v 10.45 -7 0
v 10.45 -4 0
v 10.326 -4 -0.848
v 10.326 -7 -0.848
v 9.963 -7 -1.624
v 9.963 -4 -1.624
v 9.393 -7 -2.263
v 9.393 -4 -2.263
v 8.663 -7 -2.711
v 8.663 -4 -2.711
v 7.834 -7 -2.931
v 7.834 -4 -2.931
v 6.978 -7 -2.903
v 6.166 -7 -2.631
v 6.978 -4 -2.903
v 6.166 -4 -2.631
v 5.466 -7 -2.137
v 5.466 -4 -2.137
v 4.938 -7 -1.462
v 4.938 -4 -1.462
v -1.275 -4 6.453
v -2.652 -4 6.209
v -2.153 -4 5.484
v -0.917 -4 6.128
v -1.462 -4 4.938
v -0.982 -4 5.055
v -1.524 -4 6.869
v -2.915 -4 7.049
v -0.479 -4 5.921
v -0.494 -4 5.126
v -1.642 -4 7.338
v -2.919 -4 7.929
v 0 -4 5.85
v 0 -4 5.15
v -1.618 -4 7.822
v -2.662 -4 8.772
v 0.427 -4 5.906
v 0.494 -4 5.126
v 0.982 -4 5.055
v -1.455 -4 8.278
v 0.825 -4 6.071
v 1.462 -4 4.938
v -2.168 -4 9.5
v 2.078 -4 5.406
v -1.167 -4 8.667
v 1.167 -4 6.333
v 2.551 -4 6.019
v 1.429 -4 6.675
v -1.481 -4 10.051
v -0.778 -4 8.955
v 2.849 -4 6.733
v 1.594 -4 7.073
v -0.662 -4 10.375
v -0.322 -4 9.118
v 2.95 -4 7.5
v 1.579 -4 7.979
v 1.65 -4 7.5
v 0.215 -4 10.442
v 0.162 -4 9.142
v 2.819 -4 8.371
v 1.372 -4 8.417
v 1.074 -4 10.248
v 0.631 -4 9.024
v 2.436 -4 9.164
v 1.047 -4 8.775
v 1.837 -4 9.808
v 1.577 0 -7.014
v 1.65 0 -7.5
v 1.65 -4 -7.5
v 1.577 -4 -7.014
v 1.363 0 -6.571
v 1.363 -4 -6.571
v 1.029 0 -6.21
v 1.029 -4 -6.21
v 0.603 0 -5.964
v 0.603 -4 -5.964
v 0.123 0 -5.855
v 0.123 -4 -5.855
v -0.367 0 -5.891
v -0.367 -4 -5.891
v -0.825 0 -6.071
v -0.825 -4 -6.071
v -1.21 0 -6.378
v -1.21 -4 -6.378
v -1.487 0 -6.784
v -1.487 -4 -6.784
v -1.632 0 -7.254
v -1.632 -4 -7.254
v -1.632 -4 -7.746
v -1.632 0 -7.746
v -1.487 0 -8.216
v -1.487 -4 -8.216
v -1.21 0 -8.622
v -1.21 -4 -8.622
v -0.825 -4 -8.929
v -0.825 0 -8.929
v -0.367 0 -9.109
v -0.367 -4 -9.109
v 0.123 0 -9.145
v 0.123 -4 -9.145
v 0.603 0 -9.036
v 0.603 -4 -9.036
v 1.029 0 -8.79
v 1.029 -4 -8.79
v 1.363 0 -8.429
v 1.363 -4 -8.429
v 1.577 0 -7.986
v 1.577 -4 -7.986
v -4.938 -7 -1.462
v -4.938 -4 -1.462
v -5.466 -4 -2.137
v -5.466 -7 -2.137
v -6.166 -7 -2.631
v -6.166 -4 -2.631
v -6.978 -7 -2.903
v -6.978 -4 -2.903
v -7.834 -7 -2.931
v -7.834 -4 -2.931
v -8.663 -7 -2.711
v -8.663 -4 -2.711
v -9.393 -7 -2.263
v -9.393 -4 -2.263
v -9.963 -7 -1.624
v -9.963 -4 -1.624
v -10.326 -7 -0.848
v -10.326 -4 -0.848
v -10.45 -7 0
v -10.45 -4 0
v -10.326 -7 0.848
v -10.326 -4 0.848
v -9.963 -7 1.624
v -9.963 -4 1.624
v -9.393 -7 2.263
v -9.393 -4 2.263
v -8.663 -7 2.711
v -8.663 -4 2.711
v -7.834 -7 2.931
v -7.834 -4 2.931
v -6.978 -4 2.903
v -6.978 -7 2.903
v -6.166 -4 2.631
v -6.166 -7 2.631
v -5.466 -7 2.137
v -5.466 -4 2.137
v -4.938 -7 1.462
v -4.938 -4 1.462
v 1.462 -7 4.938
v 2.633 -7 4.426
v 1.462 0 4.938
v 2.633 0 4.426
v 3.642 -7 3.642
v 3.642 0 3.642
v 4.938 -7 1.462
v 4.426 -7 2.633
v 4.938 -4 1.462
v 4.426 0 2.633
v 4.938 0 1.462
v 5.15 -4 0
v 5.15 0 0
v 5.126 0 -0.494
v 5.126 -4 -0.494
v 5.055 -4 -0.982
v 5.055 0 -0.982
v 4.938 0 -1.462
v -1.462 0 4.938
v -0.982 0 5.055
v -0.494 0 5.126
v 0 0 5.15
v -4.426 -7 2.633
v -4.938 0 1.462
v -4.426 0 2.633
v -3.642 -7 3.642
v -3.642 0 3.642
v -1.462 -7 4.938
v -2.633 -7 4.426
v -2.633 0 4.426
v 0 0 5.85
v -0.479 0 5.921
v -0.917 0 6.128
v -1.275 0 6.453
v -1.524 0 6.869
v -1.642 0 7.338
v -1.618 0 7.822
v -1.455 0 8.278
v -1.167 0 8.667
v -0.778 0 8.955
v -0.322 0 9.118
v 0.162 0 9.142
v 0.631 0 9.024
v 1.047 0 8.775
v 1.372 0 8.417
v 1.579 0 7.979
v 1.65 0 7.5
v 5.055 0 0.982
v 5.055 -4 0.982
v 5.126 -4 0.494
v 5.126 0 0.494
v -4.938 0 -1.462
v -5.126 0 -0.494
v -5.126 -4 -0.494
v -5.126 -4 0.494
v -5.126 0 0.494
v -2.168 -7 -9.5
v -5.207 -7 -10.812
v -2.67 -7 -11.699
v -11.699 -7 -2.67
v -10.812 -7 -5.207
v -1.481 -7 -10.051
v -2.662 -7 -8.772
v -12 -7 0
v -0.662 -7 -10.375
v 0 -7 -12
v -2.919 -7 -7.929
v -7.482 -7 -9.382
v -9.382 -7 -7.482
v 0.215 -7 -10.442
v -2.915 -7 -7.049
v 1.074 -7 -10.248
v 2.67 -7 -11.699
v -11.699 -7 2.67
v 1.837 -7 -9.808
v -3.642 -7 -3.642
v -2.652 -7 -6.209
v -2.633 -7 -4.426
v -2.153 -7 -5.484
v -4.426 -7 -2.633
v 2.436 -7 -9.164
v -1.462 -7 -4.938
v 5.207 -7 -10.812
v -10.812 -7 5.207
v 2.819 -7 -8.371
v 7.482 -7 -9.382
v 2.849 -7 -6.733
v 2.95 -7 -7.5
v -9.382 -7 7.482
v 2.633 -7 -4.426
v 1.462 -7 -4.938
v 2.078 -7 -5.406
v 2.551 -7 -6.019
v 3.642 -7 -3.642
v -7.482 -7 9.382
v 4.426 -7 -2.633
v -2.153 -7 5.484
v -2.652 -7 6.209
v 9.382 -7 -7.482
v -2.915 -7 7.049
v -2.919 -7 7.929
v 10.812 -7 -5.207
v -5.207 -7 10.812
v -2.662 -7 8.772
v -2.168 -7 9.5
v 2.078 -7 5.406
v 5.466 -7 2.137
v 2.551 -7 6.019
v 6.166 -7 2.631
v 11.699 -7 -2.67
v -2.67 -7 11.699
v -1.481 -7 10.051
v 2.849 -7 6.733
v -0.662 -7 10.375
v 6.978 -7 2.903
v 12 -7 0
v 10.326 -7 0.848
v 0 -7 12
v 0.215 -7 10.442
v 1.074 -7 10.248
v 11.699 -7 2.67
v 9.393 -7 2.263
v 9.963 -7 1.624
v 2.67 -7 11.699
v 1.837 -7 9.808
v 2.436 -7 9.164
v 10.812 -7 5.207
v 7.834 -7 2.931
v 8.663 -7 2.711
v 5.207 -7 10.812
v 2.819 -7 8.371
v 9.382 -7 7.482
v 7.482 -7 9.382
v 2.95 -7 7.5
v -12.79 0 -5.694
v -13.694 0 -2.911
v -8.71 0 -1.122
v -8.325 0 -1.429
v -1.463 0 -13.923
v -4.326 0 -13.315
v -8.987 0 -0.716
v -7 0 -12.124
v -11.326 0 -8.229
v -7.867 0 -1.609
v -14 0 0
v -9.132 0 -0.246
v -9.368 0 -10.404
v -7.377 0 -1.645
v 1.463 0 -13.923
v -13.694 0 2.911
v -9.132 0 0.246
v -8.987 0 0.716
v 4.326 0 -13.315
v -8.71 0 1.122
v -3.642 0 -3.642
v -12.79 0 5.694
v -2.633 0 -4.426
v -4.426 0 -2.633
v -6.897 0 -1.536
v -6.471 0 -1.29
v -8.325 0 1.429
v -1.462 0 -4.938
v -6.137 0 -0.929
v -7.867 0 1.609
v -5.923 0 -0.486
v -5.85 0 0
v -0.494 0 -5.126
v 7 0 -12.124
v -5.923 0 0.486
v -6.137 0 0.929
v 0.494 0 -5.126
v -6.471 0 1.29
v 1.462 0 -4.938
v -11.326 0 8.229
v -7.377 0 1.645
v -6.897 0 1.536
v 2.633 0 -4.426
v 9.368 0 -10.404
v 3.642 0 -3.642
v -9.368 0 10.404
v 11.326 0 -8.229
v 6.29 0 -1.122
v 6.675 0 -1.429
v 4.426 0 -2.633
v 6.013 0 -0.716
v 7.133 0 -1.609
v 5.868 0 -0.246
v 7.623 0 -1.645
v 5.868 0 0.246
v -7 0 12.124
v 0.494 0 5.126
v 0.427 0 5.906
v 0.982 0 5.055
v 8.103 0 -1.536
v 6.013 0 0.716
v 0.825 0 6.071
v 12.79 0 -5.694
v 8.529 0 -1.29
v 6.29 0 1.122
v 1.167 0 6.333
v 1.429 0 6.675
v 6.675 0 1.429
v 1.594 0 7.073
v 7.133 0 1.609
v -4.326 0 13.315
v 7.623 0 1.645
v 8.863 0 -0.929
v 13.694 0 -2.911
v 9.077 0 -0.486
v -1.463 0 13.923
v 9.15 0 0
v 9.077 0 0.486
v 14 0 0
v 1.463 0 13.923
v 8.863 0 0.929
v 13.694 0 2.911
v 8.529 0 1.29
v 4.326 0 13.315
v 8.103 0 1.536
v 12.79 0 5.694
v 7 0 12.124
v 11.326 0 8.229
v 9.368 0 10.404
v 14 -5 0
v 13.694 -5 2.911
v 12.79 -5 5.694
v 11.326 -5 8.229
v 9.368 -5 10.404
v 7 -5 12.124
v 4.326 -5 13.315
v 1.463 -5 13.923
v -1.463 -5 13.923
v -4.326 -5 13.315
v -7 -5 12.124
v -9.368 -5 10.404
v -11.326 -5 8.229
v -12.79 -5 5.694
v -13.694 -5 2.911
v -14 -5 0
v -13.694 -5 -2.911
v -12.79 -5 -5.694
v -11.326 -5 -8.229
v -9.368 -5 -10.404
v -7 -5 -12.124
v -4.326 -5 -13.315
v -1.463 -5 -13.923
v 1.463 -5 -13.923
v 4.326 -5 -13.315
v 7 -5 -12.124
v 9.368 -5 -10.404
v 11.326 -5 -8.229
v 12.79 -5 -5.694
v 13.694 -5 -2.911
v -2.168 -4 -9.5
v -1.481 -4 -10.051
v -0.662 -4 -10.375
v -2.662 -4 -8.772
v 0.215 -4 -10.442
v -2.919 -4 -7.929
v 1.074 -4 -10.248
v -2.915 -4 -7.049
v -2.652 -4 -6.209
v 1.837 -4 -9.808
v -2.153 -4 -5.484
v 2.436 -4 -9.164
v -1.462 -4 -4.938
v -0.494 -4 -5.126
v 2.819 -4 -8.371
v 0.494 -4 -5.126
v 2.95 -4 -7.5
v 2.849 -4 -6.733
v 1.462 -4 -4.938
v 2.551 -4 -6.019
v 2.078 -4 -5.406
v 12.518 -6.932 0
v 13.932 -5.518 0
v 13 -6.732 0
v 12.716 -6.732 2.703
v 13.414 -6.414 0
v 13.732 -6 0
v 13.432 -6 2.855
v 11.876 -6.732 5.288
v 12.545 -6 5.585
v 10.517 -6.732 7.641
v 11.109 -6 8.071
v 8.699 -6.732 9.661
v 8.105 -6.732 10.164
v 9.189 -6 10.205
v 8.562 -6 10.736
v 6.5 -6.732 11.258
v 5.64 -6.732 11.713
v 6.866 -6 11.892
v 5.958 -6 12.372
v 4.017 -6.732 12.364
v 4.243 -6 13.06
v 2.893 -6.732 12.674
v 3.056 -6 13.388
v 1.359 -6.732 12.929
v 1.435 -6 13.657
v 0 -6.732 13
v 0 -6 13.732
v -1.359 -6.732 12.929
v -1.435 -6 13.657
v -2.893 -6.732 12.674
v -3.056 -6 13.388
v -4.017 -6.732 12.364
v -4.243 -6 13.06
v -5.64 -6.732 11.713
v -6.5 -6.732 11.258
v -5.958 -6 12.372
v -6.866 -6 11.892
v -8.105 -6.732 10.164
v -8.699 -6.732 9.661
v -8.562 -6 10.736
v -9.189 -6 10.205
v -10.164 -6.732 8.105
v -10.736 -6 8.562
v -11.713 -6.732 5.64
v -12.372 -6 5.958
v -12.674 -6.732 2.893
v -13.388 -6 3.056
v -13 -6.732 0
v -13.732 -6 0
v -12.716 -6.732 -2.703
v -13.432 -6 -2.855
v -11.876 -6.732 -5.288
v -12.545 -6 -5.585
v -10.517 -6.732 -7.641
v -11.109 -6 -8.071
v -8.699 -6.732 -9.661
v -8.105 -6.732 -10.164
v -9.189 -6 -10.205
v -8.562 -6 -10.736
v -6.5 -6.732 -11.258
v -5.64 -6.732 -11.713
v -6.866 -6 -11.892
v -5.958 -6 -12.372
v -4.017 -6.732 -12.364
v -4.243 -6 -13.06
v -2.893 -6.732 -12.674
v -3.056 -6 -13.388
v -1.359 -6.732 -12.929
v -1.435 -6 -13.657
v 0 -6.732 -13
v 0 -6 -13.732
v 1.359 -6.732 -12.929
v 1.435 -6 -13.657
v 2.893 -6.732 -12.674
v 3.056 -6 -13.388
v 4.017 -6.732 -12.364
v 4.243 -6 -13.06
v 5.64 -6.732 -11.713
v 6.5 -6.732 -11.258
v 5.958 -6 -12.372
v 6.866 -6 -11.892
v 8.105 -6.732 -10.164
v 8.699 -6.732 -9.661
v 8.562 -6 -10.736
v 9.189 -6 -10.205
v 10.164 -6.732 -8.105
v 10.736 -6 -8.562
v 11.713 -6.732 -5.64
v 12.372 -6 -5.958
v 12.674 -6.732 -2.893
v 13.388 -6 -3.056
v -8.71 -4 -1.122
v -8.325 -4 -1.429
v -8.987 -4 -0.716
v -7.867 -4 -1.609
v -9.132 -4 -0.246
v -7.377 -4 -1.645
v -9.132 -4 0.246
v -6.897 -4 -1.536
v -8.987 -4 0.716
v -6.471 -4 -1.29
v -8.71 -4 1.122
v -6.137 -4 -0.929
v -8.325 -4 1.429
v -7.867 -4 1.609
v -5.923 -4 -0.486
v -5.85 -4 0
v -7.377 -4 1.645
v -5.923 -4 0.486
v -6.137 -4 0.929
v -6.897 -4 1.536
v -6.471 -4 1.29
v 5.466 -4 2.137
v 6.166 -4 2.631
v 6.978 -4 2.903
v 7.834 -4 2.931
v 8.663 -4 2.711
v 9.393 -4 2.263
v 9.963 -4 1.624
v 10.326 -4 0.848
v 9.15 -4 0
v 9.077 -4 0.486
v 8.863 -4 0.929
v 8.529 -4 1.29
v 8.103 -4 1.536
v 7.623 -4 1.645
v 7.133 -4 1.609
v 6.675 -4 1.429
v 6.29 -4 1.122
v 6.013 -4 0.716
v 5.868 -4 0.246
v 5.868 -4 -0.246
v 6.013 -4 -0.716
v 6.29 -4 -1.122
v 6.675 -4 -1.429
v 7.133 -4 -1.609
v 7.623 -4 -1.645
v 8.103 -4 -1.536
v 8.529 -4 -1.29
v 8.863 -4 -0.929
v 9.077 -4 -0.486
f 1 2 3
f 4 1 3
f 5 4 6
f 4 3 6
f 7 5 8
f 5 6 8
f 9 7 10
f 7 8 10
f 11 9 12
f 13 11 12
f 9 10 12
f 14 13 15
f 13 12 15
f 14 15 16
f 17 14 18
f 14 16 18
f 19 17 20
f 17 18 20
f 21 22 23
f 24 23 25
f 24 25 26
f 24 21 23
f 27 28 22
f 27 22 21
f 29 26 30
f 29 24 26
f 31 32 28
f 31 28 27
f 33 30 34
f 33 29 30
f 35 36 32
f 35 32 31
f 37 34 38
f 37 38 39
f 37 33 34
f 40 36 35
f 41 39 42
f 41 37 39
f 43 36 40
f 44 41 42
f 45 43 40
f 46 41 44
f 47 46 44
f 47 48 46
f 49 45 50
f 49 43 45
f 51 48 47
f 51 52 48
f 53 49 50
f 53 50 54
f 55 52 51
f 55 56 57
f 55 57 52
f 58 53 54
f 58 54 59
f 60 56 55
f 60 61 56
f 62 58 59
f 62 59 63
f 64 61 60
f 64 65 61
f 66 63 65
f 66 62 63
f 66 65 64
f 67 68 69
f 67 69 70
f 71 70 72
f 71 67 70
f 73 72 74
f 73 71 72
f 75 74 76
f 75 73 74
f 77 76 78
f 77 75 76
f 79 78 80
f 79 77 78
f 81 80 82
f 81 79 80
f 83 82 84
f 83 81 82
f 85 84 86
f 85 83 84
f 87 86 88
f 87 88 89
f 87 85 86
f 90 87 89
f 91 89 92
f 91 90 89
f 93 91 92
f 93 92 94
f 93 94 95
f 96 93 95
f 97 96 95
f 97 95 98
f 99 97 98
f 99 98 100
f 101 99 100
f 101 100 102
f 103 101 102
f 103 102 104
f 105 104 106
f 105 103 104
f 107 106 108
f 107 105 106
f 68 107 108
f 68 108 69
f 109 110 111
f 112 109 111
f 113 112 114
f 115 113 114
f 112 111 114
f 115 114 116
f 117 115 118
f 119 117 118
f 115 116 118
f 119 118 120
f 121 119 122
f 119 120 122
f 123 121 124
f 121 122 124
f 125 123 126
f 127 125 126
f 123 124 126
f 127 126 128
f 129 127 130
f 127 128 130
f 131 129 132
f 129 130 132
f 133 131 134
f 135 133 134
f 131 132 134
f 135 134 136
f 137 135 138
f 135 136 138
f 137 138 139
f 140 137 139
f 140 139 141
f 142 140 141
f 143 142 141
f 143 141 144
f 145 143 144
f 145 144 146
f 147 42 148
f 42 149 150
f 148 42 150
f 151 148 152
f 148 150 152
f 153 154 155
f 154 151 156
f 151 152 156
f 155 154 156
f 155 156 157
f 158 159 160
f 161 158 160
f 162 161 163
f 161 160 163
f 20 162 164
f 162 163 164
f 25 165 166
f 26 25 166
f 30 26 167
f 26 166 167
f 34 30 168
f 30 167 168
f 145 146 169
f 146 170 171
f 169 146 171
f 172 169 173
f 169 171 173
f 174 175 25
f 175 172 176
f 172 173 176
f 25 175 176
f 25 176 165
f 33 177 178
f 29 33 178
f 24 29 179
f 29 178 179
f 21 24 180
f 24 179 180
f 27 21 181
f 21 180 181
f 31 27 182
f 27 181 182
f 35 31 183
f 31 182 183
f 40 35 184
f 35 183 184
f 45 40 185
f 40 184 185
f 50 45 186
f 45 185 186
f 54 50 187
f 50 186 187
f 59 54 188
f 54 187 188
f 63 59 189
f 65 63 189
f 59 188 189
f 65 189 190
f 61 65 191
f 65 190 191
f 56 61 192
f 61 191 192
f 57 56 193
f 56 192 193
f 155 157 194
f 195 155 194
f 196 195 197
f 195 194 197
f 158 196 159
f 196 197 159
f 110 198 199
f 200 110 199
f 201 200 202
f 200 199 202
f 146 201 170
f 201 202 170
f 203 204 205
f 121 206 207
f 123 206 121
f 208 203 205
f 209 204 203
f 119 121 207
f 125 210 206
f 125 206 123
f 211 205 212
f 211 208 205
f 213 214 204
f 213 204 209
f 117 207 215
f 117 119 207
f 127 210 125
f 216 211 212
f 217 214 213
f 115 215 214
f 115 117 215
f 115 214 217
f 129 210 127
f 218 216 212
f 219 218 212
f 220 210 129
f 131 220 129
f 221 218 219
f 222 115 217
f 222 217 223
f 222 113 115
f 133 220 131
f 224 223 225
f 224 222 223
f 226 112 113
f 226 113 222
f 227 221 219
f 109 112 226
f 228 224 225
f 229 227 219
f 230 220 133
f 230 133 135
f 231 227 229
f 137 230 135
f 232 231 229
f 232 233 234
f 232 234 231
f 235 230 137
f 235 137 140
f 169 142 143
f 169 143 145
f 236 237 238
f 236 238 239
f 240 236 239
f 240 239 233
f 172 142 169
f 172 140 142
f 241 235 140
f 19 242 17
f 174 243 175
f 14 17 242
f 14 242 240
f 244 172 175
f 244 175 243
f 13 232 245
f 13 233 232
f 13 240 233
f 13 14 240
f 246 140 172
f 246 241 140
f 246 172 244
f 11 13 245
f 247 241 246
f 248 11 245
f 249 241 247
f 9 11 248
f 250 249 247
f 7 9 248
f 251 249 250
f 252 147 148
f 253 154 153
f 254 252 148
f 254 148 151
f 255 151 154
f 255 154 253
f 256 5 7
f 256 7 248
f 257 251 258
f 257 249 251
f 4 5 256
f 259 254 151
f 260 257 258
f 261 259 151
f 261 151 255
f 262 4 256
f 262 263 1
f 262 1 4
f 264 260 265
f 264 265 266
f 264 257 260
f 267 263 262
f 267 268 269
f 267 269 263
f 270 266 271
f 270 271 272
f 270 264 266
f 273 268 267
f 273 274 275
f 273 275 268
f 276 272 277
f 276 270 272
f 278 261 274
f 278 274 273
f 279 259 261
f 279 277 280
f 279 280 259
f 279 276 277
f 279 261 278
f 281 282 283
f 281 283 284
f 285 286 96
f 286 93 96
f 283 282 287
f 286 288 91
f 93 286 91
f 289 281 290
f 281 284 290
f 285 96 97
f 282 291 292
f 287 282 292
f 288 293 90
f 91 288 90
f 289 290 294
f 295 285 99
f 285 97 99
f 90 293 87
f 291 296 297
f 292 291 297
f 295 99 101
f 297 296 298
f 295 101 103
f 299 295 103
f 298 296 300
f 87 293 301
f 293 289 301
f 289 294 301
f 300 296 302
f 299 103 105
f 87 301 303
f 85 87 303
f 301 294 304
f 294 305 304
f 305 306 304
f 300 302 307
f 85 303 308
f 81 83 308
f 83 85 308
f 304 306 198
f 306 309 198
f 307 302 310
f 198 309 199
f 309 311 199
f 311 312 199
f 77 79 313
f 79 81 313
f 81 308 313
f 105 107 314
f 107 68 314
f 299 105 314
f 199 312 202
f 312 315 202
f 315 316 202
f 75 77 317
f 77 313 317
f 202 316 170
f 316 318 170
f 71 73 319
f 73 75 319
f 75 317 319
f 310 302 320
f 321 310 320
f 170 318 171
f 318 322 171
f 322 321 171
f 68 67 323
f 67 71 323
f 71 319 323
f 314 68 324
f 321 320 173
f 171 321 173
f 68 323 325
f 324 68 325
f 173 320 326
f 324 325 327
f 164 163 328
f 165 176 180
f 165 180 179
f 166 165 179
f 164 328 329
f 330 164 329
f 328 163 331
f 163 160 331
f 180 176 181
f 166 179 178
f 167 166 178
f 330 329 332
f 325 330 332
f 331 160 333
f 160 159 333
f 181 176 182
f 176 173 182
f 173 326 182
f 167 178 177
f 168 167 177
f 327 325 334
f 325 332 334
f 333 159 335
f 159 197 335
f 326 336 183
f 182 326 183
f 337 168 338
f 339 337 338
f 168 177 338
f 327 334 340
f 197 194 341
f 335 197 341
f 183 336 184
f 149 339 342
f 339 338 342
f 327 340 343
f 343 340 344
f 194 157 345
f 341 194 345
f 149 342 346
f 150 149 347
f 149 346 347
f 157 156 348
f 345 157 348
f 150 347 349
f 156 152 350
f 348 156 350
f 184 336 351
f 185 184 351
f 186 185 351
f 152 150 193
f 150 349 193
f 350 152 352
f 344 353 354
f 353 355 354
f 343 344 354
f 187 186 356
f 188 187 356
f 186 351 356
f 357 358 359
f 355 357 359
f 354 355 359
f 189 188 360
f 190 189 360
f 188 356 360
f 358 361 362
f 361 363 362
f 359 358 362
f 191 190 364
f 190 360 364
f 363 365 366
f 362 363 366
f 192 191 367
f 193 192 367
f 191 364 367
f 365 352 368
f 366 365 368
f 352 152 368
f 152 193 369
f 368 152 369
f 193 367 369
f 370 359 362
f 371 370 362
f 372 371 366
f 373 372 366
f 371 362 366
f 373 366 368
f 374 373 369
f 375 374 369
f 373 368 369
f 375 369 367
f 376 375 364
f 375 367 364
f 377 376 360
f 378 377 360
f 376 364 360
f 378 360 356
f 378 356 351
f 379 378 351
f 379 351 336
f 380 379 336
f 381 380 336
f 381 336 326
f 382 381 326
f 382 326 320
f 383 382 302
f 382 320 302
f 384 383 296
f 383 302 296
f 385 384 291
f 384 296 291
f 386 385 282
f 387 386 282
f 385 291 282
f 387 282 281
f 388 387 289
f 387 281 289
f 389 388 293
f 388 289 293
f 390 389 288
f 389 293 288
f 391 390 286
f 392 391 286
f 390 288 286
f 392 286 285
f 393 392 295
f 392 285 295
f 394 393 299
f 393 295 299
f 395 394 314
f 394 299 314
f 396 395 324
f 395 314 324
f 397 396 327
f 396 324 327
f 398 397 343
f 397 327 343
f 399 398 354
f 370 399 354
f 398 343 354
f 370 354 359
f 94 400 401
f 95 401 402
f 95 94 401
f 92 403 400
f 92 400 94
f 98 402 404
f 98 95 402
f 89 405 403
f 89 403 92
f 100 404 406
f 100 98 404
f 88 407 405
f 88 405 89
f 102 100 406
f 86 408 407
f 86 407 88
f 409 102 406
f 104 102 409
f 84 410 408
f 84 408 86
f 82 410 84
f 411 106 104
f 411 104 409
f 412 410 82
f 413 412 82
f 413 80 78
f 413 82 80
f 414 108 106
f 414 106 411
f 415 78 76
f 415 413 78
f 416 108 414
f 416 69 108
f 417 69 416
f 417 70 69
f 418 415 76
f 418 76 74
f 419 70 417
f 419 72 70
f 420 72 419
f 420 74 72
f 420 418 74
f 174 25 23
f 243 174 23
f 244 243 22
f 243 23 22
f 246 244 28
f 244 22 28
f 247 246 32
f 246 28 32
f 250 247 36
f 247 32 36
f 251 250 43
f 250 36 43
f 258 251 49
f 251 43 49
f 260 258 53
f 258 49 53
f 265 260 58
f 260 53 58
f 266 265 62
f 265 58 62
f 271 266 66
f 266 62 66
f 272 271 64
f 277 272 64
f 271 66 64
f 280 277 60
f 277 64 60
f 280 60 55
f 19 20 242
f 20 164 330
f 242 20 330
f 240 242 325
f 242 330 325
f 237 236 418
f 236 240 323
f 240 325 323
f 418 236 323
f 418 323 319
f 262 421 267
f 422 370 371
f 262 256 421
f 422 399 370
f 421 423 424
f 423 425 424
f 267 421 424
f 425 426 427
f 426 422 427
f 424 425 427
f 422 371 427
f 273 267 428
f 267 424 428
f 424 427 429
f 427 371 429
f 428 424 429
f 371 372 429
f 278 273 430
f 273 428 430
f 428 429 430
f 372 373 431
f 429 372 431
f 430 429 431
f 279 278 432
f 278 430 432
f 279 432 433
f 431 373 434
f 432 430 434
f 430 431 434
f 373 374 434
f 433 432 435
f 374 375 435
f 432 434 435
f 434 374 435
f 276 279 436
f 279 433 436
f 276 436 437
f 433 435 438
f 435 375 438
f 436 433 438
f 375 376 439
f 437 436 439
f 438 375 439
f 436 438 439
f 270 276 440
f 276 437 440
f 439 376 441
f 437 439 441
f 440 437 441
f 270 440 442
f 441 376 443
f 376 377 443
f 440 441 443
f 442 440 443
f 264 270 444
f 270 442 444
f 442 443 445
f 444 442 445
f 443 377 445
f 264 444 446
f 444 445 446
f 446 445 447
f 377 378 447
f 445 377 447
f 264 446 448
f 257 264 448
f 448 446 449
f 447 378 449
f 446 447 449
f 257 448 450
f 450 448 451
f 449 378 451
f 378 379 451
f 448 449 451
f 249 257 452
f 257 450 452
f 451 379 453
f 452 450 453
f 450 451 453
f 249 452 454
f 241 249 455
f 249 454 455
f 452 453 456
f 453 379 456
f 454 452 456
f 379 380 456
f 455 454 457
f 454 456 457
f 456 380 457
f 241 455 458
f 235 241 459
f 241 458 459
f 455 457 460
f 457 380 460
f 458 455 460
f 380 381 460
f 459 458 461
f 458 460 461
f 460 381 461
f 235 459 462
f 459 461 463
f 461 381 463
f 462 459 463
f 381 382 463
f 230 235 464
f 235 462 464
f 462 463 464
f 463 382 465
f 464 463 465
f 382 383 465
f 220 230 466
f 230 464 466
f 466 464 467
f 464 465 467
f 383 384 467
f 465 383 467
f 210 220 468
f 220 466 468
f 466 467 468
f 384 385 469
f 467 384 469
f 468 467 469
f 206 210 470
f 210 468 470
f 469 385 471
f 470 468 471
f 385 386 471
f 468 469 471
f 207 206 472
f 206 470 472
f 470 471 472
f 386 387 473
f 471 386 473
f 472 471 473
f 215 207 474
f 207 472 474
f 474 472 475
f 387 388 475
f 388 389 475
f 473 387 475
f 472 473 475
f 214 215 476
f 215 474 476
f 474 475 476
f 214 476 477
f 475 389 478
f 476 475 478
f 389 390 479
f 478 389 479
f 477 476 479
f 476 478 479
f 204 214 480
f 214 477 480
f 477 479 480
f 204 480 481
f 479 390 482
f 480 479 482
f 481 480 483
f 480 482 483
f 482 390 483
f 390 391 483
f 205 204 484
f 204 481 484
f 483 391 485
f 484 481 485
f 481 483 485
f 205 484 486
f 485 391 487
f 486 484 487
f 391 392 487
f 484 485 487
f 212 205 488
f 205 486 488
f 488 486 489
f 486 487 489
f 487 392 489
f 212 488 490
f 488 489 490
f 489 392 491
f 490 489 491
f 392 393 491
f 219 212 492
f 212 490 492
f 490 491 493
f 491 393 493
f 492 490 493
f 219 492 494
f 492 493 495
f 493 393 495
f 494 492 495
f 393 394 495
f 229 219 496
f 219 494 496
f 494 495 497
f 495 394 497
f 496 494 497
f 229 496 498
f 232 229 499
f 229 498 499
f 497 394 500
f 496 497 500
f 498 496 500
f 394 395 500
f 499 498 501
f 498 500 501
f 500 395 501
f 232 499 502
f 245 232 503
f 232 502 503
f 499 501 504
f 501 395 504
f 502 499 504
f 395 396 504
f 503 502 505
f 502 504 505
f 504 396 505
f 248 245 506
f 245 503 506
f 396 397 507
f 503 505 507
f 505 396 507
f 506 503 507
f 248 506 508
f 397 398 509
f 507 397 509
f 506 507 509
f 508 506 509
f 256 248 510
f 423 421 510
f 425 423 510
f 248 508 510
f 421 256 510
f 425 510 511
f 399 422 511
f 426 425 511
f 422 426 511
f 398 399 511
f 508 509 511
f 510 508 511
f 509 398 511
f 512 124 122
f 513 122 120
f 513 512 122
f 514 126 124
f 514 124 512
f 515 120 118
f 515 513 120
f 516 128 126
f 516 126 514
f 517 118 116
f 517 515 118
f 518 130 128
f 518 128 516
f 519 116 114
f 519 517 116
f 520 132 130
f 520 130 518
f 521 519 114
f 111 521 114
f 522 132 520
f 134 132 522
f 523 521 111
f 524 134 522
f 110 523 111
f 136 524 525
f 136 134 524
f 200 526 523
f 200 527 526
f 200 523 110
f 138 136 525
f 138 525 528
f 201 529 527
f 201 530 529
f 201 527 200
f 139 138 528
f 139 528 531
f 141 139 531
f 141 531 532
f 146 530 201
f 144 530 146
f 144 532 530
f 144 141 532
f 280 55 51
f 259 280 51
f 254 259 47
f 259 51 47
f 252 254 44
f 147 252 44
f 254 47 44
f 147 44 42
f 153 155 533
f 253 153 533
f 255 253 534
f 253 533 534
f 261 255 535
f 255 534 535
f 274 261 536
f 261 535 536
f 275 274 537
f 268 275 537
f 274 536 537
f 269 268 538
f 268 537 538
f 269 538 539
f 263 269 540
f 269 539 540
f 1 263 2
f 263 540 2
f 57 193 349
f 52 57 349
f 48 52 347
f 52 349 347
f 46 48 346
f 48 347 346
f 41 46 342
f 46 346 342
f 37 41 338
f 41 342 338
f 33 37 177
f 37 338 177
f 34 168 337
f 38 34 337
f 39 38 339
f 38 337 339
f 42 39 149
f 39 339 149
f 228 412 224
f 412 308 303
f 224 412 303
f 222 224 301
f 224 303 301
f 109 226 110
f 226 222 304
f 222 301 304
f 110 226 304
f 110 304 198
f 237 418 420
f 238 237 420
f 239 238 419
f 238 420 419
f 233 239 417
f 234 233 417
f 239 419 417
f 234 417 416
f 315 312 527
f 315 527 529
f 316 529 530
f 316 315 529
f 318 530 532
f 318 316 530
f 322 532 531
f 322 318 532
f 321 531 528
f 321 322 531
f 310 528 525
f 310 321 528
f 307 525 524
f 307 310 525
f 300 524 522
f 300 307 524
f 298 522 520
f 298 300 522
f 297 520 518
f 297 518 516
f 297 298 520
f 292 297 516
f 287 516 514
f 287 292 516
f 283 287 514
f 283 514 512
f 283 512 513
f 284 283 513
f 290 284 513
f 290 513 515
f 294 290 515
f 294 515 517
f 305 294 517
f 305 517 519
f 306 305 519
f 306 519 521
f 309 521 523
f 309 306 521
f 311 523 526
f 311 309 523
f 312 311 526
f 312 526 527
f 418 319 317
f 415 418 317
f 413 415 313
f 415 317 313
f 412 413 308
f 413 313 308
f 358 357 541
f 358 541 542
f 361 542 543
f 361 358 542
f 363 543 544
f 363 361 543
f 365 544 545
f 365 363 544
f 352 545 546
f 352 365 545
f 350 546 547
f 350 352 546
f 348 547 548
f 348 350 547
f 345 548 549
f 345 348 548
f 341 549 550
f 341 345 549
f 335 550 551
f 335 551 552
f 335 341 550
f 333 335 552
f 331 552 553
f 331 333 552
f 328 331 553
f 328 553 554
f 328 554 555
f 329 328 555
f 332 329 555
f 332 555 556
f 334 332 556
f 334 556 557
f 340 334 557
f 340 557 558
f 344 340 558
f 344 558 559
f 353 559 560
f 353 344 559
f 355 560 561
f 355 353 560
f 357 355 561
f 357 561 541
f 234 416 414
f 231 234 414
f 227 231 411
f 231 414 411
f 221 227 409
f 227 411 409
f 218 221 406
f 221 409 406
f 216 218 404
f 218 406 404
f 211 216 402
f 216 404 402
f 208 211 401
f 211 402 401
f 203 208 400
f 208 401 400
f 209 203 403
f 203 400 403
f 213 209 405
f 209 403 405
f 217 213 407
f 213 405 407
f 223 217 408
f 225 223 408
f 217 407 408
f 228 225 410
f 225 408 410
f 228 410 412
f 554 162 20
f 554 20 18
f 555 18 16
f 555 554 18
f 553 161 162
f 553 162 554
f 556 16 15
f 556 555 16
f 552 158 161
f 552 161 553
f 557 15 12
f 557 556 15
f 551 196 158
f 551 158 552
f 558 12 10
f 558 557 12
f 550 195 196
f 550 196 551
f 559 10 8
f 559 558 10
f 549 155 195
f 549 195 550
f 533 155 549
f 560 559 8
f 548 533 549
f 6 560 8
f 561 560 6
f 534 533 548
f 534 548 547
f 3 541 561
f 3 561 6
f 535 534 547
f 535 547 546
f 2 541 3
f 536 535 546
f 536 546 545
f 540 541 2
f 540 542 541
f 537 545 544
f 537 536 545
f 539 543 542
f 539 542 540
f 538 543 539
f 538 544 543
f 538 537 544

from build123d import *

# Parameters (mm, degrees)
F0_R      = 14
F1_DEPTH  = 7
F0_R_2    = 1.65
F2_DEPTH  = 4
F2_FACE_R = 1.65
F3_DEPTH  = 25
F5_R      = 2


with BuildPart() as f1:
    # F0 (on Front) → F1 (new body)
    with BuildSketch(Plane.XZ):
        Circle(F0_R)
        with BuildLine():
            ThreePointArc((1.462414, 4.938), (3.6416, 3.6416), (4.938, 1.462414))
            ThreePointArc((4.938, 1.462414), (8.256505, 2.851351), (10.45, 0))
            ThreePointArc((10.45, 0), (8.256505, -2.851351), (4.938, -1.462414))
            ThreePointArc((4.938, -1.462414), (3.6416, -3.6416), (1.462414, -4.938))
            ThreePointArc((1.462414, -4.938), (2.551139, -6.018721), (2.95, -7.5))
            ThreePointArc((2.95, -7.5), (-1.481279, -10.051139), (-1.462414, -4.938))
            ThreePointArc((-1.462414, -4.938), (-3.6416, -3.6416), (-4.938, -1.462414))
            ThreePointArc((-4.938, -1.462414), (-10.45, 0), (-4.938, 1.462414))
            ThreePointArc((-4.938, 1.462414), (-3.6416, 3.6416), (-1.462414, 4.938))
            ThreePointArc((-1.462414, 4.938), (-1.481279, 10.051139), (2.95, 7.5))
            ThreePointArc((2.95, 7.5), (2.551139, 6.018721), (1.462414, 4.938))
        make_face(mode=Mode.SUBTRACT)
    extrude(amount=F1_DEPTH)

    # F0 (on Front) → F2 (join)
    with BuildSketch(Plane.XZ):
        with BuildLine():
            ThreePointArc((-4.938, 1.462414), (-10.45, 0), (-4.938, -1.462414))
            ThreePointArc((-4.938, -1.462414), (-5.15, 0), (-4.938, 1.462414))
        make_face()
        with Locations((-7.5, 0)):
            Circle(F0_R_2, mode=Mode.SUBTRACT)
        with BuildLine():
            ThreePointArc((2.95, -7.5), (2.551139, -6.018721), (1.462414, -4.938))
            ThreePointArc((1.462414, -4.938), (0, -5.15), (-1.462414, -4.938))
            ThreePointArc((-1.462414, -4.938), (-1.481279, -10.051139), (2.95, -7.5))
        make_face()
        with Locations((0, -7.5)):
            Circle(F0_R_2, mode=Mode.SUBTRACT)
        with BuildLine():
            ThreePointArc((4.938, 1.462414), (5.096724, 0.73885), (5.15, 0))
            ThreePointArc((5.15, 0), (5.096724, -0.73885), (4.938, -1.462414))
            ThreePointArc((4.938, -1.462414), (8.256505, -2.851351), (10.45, 0))
            ThreePointArc((10.45, 0), (8.256505, 2.851351), (4.938, 1.462414))
        make_face()
        with Locations((7.5, 0)):
            Circle(F0_R_2, mode=Mode.SUBTRACT)
        with BuildLine():
            ThreePointArc((0, 5.15), (0.73885, 5.096724), (1.462414, 4.938))
            ThreePointArc((1.462414, 4.938), (2.551139, 6.018721), (2.95, 7.5))
            ThreePointArc((2.95, 7.5), (-1.481279, 10.051139), (-1.462414, 4.938))
            ThreePointArc((-1.462414, 4.938), (-0.73885, 5.096724), (0, 5.15))
        make_face()
        with BuildLine():
            ThreePointArc((1.65, 7.5), (1.166726, 6.333274), (0, 5.85))
            ThreePointArc((0, 5.85), (-1.166726, 8.666726), (1.65, 7.5))
        make_face(mode=Mode.SUBTRACT)
    extrude(amount=F2_DEPTH)

    # F5
    f5_edges = [f1.edges().sort_by_distance(p)[0] for p in [
        (-14, -7, 0),
    ]]
    fillet(f5_edges, radius=F5_R)


with BuildPart() as f3:
    # F0 (on Front) + F2_face (on face) → F3 (new body)
    with BuildSketch(Plane.XZ):
        with Locations((-7.5, 0)):
            Circle(F0_R_2)
        with BuildLine():
            ThreePointArc((-4.938, 1.462414), (-10.45, 0), (-4.938, -1.462414))
            ThreePointArc((-4.938, -1.462414), (-5.15, 0), (-4.938, 1.462414))
        make_face()
        with Locations((-7.5, 0)):
            Circle(F0_R_2, mode=Mode.SUBTRACT)
    with BuildSketch(Plane(origin=(-7.676847, -4, 0), x_dir=(1, 0, 0), z_dir=(0, -1, 0))):
        with BuildLine():
            ThreePointArc((2.738847, -1.462414), (2.526847, 0), (2.738847, 1.462414))
            ThreePointArc((2.738847, 1.462414), (-2.773153, 0), (2.738847, -1.462414))
        make_face()
        with Locations((0.176847, 0)):
            Circle(F2_FACE_R, mode=Mode.SUBTRACT)
    extrude(amount=F3_DEPTH)


solid = f1.part
